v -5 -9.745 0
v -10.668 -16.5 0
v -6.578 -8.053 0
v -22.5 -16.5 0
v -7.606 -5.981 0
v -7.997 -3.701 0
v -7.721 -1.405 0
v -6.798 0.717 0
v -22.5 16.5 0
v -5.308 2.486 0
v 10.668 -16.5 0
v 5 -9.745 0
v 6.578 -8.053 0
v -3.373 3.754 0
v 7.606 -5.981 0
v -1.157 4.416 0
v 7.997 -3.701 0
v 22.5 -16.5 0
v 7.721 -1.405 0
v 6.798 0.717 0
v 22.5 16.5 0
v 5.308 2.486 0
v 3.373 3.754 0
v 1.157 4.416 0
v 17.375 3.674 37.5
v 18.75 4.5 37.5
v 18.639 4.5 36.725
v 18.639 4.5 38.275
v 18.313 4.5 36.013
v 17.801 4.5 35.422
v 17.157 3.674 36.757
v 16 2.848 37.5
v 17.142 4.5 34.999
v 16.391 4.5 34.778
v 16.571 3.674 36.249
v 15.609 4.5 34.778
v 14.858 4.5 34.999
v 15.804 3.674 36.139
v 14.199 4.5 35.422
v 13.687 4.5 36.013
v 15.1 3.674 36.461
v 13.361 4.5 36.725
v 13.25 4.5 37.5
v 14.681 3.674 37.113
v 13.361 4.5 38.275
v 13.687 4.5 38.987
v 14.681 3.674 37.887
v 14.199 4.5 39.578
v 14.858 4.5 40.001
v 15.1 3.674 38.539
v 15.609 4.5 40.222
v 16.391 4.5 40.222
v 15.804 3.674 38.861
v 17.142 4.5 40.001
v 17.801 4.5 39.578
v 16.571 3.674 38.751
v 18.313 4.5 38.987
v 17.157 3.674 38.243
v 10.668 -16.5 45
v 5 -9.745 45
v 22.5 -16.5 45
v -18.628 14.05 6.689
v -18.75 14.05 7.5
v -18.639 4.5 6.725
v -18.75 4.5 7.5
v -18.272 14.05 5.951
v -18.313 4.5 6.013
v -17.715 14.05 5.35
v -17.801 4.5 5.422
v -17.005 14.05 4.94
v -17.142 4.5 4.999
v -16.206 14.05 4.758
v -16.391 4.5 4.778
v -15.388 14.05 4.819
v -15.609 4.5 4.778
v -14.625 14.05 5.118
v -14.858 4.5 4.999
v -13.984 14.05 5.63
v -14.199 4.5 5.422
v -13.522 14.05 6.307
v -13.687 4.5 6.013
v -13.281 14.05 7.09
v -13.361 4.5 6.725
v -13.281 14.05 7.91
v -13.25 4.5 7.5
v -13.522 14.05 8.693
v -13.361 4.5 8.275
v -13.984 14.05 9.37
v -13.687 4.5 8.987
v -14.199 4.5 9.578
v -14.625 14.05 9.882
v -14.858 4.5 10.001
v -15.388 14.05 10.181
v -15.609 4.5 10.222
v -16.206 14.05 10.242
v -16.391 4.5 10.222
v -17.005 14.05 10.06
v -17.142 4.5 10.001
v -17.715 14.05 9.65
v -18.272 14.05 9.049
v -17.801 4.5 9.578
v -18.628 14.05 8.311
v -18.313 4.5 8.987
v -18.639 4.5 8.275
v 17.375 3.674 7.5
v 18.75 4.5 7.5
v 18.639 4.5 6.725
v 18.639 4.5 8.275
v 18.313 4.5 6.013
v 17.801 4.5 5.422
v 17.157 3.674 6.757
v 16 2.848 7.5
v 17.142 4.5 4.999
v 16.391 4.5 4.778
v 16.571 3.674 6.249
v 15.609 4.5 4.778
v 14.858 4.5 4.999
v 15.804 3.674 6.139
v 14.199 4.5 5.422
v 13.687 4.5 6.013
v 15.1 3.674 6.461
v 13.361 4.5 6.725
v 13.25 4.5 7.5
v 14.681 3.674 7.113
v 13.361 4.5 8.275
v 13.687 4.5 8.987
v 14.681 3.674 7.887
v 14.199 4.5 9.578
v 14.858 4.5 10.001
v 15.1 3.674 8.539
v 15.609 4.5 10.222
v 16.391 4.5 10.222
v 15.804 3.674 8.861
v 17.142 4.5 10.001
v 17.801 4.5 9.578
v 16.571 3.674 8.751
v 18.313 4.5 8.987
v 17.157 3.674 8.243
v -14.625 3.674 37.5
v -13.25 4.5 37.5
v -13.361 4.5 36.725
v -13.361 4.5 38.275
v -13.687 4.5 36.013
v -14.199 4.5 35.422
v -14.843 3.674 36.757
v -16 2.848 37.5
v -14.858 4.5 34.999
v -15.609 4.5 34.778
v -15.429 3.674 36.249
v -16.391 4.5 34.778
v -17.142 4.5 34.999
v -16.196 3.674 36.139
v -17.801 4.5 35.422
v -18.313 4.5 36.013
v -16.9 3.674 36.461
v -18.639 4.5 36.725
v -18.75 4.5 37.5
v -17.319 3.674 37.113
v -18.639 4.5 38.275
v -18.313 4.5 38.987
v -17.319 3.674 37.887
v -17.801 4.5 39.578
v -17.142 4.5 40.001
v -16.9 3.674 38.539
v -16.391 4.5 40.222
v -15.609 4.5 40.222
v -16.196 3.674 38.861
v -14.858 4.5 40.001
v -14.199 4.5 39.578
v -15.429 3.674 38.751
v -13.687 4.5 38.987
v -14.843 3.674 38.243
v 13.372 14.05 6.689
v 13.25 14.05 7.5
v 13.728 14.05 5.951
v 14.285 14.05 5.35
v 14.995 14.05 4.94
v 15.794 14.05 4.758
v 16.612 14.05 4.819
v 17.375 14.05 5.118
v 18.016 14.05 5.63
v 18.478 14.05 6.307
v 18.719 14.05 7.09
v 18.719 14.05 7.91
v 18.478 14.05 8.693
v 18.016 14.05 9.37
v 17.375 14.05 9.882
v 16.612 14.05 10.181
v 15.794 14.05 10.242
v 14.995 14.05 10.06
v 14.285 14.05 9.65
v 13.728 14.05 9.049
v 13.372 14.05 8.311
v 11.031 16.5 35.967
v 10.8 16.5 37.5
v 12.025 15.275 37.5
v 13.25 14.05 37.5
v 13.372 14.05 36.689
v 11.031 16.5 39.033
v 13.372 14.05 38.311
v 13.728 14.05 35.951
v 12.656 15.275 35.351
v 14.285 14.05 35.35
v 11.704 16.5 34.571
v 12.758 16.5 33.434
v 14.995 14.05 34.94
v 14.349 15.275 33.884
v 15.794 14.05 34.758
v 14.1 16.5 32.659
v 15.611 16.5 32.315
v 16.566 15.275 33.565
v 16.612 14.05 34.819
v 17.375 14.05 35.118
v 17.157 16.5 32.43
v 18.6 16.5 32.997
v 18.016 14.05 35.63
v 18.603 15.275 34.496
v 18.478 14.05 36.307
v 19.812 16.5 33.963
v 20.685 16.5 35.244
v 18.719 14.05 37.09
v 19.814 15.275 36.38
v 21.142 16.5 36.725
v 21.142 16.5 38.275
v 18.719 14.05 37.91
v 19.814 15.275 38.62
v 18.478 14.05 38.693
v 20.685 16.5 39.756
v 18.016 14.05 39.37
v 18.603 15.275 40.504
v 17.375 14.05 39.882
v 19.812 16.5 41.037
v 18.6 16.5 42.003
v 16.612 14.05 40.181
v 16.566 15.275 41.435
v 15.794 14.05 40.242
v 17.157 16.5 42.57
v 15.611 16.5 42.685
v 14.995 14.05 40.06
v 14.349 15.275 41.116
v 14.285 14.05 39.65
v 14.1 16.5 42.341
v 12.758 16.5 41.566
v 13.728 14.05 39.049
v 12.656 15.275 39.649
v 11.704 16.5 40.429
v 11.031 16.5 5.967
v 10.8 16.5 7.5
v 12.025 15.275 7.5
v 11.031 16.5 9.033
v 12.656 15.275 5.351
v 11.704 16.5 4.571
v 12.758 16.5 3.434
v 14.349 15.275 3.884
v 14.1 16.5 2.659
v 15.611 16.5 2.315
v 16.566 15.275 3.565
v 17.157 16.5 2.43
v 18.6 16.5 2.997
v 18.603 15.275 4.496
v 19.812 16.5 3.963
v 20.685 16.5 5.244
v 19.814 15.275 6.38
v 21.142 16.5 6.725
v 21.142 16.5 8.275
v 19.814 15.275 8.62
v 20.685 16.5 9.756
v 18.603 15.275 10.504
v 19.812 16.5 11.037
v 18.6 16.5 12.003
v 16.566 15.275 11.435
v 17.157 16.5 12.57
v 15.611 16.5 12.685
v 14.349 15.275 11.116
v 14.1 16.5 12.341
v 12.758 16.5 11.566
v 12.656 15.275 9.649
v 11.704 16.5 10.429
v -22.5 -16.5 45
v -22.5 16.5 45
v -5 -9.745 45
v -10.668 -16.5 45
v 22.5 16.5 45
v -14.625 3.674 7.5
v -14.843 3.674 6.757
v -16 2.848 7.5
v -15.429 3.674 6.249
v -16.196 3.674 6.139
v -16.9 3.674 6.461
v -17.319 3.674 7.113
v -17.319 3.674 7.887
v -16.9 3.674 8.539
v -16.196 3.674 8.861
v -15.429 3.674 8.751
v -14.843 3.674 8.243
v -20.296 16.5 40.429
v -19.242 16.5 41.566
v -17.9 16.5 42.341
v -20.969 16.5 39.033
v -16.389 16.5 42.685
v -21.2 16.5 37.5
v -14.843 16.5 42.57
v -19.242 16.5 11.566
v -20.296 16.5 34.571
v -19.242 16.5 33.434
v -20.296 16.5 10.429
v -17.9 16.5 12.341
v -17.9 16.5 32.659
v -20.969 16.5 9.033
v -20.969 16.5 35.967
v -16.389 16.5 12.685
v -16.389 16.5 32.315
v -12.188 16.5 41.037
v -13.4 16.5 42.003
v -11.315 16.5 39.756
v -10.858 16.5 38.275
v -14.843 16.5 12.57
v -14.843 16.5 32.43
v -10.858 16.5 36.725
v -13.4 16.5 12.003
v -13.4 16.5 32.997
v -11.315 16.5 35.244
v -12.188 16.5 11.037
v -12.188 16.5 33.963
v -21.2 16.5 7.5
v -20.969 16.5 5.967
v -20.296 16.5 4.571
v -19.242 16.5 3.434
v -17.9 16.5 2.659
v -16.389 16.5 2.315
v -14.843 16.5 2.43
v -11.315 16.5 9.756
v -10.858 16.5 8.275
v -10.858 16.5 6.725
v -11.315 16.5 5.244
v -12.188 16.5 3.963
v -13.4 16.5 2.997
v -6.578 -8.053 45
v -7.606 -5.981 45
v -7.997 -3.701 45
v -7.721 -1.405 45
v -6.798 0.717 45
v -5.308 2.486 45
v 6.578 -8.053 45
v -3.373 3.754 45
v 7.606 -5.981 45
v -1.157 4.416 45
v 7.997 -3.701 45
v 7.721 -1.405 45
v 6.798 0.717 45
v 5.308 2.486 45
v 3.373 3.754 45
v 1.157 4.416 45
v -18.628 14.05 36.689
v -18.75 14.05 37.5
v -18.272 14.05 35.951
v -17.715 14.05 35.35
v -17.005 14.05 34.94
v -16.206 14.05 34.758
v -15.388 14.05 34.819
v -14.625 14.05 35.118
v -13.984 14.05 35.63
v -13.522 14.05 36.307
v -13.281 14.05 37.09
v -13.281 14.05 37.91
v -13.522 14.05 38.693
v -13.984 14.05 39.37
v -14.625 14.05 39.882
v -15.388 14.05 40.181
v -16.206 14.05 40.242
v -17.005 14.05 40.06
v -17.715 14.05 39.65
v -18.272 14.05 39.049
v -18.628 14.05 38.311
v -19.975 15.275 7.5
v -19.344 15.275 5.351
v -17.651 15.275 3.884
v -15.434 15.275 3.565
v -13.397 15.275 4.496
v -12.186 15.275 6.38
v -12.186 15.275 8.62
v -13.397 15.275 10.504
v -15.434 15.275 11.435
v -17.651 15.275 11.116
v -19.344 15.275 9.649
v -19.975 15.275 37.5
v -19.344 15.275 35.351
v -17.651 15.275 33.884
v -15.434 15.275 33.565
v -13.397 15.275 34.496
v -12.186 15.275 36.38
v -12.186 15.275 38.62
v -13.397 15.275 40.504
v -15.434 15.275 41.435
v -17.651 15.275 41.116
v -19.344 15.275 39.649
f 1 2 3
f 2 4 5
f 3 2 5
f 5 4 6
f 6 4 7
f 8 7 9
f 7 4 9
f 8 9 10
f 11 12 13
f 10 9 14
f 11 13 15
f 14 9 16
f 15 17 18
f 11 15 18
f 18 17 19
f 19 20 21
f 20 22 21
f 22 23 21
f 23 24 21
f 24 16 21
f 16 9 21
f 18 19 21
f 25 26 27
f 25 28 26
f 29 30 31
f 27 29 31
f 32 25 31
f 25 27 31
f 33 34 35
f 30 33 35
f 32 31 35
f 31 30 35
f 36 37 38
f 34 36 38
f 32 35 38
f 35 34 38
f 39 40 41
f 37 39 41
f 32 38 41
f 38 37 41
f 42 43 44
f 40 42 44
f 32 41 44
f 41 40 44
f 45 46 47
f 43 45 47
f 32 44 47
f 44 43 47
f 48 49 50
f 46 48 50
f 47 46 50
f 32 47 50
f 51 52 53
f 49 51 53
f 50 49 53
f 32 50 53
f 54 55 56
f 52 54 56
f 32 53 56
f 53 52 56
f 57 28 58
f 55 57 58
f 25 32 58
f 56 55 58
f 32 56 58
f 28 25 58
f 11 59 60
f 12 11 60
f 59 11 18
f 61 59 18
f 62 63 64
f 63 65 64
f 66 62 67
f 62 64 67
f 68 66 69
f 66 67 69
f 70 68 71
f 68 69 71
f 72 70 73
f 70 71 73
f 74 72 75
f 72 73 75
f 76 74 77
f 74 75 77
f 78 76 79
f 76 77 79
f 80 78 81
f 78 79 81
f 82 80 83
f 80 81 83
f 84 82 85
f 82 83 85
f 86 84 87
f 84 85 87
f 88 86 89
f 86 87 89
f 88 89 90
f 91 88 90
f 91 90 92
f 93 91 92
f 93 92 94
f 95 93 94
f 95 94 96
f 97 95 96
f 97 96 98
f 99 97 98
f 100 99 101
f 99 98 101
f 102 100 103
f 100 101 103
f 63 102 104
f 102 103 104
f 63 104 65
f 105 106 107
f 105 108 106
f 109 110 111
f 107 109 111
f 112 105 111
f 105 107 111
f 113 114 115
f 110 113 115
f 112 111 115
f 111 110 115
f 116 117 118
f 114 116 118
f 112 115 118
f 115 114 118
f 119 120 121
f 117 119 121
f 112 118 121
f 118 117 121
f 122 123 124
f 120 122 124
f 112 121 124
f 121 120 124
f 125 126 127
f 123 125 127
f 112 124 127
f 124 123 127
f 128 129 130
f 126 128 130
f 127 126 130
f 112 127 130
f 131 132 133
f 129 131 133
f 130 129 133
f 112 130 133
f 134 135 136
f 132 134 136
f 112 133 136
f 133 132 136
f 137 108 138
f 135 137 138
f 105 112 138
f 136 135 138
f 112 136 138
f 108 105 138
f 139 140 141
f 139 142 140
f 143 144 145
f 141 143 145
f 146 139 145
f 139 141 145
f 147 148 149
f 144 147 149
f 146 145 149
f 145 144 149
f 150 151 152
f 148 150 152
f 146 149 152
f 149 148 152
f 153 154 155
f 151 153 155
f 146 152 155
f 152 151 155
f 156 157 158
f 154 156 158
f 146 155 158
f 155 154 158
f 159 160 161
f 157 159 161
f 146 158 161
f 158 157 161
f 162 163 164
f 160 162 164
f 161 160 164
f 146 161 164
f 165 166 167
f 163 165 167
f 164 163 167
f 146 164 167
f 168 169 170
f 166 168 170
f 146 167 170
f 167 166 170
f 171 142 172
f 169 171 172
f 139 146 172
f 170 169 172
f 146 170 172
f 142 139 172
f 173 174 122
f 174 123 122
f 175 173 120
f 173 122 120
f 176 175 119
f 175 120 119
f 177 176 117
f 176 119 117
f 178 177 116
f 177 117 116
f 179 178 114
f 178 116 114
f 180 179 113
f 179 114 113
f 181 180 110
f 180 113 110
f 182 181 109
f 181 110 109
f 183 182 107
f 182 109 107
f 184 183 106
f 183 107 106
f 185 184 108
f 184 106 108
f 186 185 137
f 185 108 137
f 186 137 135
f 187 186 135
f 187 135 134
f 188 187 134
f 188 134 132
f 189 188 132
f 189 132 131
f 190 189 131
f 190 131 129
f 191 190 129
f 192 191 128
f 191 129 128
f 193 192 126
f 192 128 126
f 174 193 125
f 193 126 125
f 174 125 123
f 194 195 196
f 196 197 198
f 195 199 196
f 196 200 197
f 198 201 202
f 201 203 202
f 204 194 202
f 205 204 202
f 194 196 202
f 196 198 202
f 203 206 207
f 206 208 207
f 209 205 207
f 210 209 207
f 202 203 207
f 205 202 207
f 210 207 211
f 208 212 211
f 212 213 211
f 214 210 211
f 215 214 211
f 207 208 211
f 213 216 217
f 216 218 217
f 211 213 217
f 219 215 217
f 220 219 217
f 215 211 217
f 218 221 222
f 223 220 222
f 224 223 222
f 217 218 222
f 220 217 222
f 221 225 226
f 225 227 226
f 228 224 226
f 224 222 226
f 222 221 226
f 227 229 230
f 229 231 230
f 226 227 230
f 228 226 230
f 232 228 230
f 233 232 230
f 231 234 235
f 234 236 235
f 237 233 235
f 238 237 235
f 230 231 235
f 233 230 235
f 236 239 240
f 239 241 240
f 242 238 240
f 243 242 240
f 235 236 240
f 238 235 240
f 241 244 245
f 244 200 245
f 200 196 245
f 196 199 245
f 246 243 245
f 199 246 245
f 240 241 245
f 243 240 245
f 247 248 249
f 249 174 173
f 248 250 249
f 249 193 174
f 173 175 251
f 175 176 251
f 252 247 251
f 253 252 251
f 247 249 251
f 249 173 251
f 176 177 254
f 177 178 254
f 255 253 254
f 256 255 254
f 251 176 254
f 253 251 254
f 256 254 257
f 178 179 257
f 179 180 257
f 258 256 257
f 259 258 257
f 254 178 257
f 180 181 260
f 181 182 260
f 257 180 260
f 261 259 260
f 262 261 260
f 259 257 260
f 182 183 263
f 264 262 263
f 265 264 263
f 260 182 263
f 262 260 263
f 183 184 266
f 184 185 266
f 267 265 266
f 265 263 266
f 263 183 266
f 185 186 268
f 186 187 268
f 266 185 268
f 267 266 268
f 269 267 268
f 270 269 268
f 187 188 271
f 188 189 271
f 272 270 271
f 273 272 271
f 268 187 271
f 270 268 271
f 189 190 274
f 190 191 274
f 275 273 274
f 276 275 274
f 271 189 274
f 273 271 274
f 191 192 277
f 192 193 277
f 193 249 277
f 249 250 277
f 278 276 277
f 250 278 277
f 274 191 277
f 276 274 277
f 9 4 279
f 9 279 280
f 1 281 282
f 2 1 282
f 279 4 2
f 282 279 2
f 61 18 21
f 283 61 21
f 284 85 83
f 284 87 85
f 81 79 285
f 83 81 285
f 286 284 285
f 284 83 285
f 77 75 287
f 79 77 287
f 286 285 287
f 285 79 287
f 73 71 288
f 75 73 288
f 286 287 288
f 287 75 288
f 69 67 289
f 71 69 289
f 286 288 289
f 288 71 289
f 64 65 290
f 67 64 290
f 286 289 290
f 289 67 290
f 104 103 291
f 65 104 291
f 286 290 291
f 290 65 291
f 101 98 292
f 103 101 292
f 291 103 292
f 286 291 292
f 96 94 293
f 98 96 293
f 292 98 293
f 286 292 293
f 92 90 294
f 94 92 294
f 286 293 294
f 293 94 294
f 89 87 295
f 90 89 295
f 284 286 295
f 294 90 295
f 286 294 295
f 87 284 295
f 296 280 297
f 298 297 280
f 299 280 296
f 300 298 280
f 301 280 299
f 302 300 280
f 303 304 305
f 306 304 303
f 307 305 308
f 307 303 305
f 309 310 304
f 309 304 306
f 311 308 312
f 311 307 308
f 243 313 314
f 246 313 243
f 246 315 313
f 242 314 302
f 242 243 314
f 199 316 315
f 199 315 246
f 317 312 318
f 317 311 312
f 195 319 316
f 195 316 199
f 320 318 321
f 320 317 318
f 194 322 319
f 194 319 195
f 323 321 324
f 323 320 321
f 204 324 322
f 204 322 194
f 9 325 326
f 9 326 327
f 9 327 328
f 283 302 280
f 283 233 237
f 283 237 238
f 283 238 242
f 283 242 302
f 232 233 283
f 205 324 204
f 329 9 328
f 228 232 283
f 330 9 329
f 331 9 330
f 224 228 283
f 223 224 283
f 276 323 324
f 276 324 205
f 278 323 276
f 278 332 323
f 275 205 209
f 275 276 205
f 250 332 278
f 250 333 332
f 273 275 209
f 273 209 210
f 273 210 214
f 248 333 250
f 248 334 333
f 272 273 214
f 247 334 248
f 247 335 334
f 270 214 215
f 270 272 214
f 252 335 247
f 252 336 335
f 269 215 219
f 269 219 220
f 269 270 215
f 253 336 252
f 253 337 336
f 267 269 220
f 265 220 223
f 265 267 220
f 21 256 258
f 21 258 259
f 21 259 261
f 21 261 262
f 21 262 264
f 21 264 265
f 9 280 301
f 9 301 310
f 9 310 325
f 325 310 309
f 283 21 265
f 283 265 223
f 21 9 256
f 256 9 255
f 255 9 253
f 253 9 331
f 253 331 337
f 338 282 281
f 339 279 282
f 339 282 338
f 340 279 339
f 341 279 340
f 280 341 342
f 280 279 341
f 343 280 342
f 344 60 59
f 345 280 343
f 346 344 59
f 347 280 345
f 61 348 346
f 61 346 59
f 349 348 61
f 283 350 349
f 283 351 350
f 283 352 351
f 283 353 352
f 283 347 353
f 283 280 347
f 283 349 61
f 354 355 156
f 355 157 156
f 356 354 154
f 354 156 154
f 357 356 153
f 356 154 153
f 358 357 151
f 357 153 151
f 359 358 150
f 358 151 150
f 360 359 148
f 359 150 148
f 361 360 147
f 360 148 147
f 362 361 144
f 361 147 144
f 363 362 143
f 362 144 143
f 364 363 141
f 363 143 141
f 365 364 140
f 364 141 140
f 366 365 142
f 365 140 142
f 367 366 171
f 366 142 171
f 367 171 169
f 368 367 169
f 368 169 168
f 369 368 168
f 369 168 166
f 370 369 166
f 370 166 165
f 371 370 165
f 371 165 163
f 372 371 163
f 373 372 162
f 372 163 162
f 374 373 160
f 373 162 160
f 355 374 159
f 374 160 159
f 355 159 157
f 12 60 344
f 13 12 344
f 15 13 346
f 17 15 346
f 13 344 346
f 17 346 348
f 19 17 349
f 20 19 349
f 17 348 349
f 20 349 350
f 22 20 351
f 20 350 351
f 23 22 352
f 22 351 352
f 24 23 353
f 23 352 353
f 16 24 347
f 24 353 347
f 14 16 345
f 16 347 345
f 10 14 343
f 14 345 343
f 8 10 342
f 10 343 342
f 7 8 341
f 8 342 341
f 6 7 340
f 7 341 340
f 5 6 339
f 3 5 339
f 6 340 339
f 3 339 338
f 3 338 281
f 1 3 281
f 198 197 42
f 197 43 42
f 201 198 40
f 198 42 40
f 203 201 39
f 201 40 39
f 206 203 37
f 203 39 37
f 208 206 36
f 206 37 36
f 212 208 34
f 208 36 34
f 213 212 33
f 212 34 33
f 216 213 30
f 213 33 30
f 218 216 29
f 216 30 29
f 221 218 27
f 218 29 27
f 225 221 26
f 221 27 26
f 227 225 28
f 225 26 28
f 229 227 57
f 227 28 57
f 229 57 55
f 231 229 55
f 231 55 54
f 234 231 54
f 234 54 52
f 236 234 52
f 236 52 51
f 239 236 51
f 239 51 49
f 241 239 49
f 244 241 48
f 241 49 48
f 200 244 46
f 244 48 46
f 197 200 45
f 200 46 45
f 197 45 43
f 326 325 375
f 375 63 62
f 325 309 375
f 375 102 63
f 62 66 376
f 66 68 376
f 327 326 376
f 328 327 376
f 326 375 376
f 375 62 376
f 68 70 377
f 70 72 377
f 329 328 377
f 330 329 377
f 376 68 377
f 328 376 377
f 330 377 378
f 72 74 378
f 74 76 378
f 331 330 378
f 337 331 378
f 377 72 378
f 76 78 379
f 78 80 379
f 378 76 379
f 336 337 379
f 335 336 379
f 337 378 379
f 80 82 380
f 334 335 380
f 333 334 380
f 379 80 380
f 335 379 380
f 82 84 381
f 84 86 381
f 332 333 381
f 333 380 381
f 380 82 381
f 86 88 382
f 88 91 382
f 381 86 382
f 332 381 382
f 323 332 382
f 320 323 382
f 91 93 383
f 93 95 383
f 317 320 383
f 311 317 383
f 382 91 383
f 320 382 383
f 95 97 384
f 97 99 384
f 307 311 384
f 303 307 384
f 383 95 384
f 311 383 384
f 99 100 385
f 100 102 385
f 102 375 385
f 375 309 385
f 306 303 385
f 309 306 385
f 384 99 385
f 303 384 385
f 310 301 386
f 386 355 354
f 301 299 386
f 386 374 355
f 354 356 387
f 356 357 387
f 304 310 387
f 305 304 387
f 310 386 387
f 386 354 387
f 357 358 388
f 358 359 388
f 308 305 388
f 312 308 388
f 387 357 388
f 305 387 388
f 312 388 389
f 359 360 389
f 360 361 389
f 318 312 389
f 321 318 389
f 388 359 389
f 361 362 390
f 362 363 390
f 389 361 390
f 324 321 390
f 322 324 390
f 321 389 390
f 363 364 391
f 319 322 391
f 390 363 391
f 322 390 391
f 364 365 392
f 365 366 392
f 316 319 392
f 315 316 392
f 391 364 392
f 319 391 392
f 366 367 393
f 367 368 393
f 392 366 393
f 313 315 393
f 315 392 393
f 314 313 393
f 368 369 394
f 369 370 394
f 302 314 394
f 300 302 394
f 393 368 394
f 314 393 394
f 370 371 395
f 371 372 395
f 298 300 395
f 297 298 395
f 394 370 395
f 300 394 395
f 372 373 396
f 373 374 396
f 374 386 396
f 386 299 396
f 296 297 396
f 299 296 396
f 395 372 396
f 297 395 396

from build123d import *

# Parameters (mm, degrees)
SKETCH1_W                                            = 45
SKETCH1_H                                            = 33
BOSS_EXTRUDE1_DEPTH                                  = 45
CUT_EXTRUDE1_DEPTH                                   = 45
CSK_FOR_M5_COUNTERSUNK_RAISED_HEAD_SCREW_D           = 5.5
CSK_FOR_M5_COUNTERSUNK_RAISED_HEAD_SCREW_DEPTH       = 12
CSK_FOR_M5_COUNTERSUNK_RAISED_HEAD_SCREW_CSINK_D     = 10.4
CSK_FOR_M5_COUNTERSUNK_RAISED_HEAD_SCREW_CSINK_ANGLE = 90
CSK_FOR_M5_COUNTERSUNK_RAISED_HEAD_SCREW_TIP         = 1.652366702


with BuildPart() as part:
    # Sketch1 → Boss-Extrude1 (new body)
    with BuildSketch(Plane.XY):
        Rectangle(SKETCH1_W, SKETCH1_H)
    extrude(amount=BOSS_EXTRUDE1_DEPTH)

    # Sketch2 → Cut-Extrude1 (cut)
    with BuildSketch(Plane.XY.offset(45)):
        with BuildLine():
            Line((-5, -9.744997998), (-10.668119688, -16.5))
            Line((-10.668119688, -16.5), (10.668119688, -16.5))
            Line((10.668119688, -16.5), (5, -9.744997998))
            ThreePointArc((5, -9.744997998), (0, 4.5), (-5, -9.744997998))
        make_face()
    extrude(amount=-CUT_EXTRUDE1_DEPTH, mode=Mode.SUBTRACT)

    # CSK for M5 Countersunk Raised Head Screw1
    with Locations(Plane(origin=(0, 16.5, 0), x_dir=(1, 0, 0), z_dir=(0, 1, 0))):
        with Locations((-16, -37.5), (-16, -7.5), (16, -7.5), (16, -37.5)):
            CounterSinkHole(CSK_FOR_M5_COUNTERSUNK_RAISED_HEAD_SCREW_D / 2, CSK_FOR_M5_COUNTERSUNK_RAISED_HEAD_SCREW_CSINK_D / 2, depth=CSK_FOR_M5_COUNTERSUNK_RAISED_HEAD_SCREW_DEPTH, counter_sink_angle=CSK_FOR_M5_COUNTERSUNK_RAISED_HEAD_SCREW_CSINK_ANGLE)
            with Locations((0, 0, -(CSK_FOR_M5_COUNTERSUNK_RAISED_HEAD_SCREW_DEPTH + CSK_FOR_M5_COUNTERSUNK_RAISED_HEAD_SCREW_TIP / 2))):  # 118° drill point
                Cone(0, CSK_FOR_M5_COUNTERSUNK_RAISED_HEAD_SCREW_D / 2, CSK_FOR_M5_COUNTERSUNK_RAISED_HEAD_SCREW_TIP, mode=Mode.SUBTRACT)


solid = part.part
